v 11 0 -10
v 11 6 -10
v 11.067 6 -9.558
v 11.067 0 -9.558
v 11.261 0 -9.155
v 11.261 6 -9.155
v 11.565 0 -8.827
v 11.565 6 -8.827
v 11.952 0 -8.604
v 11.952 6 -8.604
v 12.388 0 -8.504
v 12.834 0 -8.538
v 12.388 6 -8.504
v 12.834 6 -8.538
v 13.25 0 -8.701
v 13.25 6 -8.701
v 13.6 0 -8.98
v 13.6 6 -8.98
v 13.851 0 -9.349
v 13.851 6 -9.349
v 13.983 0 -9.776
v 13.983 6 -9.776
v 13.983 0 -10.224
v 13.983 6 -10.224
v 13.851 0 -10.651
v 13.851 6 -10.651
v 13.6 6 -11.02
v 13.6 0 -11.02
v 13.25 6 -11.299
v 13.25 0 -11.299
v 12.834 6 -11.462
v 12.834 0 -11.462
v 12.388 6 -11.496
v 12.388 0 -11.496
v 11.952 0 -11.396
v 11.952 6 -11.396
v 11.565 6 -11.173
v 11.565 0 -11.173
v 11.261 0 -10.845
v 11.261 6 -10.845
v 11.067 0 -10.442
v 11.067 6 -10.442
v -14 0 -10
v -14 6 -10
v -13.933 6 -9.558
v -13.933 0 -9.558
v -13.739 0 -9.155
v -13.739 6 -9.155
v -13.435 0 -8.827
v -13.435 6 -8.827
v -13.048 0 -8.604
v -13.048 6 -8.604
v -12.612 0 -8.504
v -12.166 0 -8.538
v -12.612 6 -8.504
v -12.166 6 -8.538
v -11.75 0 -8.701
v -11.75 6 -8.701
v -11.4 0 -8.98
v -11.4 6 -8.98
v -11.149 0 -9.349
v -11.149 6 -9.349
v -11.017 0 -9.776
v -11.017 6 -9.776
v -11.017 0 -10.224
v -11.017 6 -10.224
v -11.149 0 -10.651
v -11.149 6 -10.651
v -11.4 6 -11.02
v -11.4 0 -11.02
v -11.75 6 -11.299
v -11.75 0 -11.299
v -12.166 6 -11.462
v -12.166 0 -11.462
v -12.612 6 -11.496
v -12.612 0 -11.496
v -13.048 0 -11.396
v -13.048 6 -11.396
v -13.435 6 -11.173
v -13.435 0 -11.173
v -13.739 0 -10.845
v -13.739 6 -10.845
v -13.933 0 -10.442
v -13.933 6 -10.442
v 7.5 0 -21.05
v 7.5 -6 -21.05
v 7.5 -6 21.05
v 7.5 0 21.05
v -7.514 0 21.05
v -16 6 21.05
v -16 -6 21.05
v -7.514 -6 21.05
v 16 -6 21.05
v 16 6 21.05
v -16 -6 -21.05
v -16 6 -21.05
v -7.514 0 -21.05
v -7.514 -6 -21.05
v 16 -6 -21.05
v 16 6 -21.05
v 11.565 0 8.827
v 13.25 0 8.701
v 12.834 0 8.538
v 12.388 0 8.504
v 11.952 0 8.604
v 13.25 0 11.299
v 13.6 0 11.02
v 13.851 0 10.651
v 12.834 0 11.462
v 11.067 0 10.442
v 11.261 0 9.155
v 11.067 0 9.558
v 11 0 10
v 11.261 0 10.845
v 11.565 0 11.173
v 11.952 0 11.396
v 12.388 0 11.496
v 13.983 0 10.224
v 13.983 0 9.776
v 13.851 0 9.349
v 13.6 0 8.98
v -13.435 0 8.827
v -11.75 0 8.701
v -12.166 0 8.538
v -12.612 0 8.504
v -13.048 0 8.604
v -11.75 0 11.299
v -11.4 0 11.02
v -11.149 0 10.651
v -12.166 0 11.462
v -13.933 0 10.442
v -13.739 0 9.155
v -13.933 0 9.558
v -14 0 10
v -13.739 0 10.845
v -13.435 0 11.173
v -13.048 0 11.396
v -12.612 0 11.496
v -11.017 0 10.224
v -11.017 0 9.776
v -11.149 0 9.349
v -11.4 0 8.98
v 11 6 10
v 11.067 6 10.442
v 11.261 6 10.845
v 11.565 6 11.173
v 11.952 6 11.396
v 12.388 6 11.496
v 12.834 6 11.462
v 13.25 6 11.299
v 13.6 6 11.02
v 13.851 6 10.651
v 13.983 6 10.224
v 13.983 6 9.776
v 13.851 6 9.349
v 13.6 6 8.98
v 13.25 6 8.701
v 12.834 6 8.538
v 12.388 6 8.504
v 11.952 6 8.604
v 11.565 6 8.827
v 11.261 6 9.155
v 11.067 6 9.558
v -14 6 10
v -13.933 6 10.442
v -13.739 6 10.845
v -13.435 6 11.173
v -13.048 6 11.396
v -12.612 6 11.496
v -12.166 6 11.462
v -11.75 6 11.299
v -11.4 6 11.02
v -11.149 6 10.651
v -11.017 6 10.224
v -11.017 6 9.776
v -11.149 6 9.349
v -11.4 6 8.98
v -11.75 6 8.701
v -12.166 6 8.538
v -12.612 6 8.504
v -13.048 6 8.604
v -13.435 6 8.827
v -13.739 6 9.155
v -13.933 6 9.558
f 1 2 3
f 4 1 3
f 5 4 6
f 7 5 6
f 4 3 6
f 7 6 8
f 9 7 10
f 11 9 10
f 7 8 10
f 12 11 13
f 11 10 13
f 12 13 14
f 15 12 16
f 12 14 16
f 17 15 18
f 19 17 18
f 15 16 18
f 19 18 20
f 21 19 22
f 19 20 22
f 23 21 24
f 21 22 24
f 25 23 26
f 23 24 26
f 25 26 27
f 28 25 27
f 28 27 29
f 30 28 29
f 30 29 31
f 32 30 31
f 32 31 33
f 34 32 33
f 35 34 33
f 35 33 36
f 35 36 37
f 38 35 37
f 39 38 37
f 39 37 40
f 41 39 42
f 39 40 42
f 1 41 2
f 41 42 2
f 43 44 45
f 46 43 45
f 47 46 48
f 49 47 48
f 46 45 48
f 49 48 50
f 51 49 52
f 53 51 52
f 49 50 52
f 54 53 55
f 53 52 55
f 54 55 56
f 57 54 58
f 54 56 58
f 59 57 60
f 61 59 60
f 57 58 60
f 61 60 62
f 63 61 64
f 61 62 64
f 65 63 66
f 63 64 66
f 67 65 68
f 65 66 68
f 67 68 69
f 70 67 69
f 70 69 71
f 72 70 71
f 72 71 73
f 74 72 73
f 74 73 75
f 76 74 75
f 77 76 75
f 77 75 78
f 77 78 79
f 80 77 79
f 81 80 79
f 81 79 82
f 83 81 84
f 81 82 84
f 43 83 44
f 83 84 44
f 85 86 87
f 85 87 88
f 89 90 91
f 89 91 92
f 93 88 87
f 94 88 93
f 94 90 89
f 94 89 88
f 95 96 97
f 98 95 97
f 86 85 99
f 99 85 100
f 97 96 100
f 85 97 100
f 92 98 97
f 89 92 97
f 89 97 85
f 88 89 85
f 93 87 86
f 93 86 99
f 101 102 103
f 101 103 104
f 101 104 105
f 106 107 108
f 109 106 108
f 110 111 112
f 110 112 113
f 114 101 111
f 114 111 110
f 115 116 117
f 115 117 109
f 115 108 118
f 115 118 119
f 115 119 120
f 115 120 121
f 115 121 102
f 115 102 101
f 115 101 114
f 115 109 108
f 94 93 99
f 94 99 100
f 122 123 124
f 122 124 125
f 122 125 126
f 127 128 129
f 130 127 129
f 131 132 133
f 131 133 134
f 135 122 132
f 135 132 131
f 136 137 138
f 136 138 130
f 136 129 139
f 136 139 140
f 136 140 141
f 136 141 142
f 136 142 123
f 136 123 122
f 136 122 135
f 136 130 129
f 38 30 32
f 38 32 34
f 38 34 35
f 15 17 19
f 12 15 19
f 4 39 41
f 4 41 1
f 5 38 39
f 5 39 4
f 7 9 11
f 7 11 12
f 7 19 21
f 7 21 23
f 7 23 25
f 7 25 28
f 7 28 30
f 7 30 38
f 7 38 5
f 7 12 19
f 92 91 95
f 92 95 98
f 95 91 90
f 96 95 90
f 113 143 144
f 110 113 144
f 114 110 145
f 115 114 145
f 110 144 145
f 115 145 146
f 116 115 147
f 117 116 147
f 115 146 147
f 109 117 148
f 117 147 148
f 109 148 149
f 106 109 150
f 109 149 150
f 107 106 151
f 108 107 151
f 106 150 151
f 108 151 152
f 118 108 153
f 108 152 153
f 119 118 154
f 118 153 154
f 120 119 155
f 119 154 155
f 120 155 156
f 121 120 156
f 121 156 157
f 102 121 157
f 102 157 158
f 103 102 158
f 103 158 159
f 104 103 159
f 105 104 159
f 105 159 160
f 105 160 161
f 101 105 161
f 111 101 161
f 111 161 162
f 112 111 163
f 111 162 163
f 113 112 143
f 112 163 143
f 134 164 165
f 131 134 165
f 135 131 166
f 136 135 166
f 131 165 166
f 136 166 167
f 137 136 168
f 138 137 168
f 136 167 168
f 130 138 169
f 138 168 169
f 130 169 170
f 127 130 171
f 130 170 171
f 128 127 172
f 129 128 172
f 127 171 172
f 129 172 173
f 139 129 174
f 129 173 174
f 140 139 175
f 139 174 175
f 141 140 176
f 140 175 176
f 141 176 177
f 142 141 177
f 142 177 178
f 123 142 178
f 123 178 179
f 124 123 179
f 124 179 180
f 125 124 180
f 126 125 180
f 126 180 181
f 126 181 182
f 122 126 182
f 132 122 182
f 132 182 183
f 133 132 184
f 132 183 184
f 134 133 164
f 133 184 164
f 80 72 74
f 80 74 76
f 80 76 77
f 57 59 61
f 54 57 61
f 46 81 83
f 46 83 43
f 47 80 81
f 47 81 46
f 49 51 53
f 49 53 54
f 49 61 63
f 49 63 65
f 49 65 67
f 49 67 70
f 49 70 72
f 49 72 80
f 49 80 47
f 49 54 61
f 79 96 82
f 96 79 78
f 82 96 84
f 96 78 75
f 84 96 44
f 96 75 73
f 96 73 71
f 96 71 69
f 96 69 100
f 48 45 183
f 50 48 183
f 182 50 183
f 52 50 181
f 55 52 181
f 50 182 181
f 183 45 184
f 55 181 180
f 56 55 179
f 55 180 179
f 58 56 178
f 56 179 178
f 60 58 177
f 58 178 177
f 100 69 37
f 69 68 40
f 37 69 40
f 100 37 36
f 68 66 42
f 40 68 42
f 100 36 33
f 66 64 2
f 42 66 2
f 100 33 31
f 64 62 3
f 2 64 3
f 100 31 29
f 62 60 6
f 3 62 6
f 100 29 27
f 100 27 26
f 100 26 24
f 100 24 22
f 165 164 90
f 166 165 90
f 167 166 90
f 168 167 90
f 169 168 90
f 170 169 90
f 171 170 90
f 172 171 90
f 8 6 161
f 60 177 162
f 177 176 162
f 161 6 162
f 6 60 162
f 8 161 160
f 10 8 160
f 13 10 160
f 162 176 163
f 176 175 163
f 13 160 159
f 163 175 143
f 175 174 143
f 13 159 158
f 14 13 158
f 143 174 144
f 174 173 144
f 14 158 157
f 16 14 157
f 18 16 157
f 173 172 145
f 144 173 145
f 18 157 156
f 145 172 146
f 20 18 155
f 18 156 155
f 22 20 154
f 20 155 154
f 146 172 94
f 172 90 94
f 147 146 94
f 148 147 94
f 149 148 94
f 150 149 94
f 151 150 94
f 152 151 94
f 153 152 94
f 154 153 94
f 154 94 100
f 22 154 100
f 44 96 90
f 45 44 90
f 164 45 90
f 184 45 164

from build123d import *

# Parameters (mm, degrees)
SKETCH1_W           = 32
SKETCH1_H           = 12
BOSS_EXTRUDE1_DEPTH = 21.05
SKETCH2_W           = 15.014140453
SKETCH2_H           = 6
CUT_EXTRUDE1_DEPTH  = 46.435778853
SKETCH3_R           = 1.5
CUT_EXTRUDE2_DEPTH  = 6


with BuildPart() as part:
    # Sketch1 → Boss-Extrude1 (new, symmetric)
    with BuildSketch(Plane.XY):
        Rectangle(SKETCH1_W, SKETCH1_H)
    extrude(amount=BOSS_EXTRUDE1_DEPTH, both=True)

    # Sketch2 → Cut-Extrude1 (cut, through all)
    with BuildSketch(Plane.XY.offset(21.05)):
        with Locations((-0.007070226, -3)):
            Rectangle(SKETCH2_W, SKETCH2_H)
    extrude(amount=-CUT_EXTRUDE1_DEPTH, mode=Mode.SUBTRACT)

    # Sketch3 → Cut-Extrude2 (cut)
    with BuildSketch(Plane(origin=(0, 6, 0), x_dir=(1, 0, 0), z_dir=(0, 1, 0))):
        with Locations(Location((-12.5, 10, 0), (0, 0, 180))):
            Circle(SKETCH3_R)
        with Locations(Location((12.5, 10, 0), (0, 0, 180))):
            Circle(SKETCH3_R)
        with Locations(Location((12.5, -10, 0), (0, 0, 180))):
            Circle(SKETCH3_R)
        with Locations(Location((-12.5, -10, 0), (0, 0, 180))):
            Circle(SKETCH3_R)
    extrude(amount=-CUT_EXTRUDE2_DEPTH, mode=Mode.SUBTRACT)


solid = part.part
